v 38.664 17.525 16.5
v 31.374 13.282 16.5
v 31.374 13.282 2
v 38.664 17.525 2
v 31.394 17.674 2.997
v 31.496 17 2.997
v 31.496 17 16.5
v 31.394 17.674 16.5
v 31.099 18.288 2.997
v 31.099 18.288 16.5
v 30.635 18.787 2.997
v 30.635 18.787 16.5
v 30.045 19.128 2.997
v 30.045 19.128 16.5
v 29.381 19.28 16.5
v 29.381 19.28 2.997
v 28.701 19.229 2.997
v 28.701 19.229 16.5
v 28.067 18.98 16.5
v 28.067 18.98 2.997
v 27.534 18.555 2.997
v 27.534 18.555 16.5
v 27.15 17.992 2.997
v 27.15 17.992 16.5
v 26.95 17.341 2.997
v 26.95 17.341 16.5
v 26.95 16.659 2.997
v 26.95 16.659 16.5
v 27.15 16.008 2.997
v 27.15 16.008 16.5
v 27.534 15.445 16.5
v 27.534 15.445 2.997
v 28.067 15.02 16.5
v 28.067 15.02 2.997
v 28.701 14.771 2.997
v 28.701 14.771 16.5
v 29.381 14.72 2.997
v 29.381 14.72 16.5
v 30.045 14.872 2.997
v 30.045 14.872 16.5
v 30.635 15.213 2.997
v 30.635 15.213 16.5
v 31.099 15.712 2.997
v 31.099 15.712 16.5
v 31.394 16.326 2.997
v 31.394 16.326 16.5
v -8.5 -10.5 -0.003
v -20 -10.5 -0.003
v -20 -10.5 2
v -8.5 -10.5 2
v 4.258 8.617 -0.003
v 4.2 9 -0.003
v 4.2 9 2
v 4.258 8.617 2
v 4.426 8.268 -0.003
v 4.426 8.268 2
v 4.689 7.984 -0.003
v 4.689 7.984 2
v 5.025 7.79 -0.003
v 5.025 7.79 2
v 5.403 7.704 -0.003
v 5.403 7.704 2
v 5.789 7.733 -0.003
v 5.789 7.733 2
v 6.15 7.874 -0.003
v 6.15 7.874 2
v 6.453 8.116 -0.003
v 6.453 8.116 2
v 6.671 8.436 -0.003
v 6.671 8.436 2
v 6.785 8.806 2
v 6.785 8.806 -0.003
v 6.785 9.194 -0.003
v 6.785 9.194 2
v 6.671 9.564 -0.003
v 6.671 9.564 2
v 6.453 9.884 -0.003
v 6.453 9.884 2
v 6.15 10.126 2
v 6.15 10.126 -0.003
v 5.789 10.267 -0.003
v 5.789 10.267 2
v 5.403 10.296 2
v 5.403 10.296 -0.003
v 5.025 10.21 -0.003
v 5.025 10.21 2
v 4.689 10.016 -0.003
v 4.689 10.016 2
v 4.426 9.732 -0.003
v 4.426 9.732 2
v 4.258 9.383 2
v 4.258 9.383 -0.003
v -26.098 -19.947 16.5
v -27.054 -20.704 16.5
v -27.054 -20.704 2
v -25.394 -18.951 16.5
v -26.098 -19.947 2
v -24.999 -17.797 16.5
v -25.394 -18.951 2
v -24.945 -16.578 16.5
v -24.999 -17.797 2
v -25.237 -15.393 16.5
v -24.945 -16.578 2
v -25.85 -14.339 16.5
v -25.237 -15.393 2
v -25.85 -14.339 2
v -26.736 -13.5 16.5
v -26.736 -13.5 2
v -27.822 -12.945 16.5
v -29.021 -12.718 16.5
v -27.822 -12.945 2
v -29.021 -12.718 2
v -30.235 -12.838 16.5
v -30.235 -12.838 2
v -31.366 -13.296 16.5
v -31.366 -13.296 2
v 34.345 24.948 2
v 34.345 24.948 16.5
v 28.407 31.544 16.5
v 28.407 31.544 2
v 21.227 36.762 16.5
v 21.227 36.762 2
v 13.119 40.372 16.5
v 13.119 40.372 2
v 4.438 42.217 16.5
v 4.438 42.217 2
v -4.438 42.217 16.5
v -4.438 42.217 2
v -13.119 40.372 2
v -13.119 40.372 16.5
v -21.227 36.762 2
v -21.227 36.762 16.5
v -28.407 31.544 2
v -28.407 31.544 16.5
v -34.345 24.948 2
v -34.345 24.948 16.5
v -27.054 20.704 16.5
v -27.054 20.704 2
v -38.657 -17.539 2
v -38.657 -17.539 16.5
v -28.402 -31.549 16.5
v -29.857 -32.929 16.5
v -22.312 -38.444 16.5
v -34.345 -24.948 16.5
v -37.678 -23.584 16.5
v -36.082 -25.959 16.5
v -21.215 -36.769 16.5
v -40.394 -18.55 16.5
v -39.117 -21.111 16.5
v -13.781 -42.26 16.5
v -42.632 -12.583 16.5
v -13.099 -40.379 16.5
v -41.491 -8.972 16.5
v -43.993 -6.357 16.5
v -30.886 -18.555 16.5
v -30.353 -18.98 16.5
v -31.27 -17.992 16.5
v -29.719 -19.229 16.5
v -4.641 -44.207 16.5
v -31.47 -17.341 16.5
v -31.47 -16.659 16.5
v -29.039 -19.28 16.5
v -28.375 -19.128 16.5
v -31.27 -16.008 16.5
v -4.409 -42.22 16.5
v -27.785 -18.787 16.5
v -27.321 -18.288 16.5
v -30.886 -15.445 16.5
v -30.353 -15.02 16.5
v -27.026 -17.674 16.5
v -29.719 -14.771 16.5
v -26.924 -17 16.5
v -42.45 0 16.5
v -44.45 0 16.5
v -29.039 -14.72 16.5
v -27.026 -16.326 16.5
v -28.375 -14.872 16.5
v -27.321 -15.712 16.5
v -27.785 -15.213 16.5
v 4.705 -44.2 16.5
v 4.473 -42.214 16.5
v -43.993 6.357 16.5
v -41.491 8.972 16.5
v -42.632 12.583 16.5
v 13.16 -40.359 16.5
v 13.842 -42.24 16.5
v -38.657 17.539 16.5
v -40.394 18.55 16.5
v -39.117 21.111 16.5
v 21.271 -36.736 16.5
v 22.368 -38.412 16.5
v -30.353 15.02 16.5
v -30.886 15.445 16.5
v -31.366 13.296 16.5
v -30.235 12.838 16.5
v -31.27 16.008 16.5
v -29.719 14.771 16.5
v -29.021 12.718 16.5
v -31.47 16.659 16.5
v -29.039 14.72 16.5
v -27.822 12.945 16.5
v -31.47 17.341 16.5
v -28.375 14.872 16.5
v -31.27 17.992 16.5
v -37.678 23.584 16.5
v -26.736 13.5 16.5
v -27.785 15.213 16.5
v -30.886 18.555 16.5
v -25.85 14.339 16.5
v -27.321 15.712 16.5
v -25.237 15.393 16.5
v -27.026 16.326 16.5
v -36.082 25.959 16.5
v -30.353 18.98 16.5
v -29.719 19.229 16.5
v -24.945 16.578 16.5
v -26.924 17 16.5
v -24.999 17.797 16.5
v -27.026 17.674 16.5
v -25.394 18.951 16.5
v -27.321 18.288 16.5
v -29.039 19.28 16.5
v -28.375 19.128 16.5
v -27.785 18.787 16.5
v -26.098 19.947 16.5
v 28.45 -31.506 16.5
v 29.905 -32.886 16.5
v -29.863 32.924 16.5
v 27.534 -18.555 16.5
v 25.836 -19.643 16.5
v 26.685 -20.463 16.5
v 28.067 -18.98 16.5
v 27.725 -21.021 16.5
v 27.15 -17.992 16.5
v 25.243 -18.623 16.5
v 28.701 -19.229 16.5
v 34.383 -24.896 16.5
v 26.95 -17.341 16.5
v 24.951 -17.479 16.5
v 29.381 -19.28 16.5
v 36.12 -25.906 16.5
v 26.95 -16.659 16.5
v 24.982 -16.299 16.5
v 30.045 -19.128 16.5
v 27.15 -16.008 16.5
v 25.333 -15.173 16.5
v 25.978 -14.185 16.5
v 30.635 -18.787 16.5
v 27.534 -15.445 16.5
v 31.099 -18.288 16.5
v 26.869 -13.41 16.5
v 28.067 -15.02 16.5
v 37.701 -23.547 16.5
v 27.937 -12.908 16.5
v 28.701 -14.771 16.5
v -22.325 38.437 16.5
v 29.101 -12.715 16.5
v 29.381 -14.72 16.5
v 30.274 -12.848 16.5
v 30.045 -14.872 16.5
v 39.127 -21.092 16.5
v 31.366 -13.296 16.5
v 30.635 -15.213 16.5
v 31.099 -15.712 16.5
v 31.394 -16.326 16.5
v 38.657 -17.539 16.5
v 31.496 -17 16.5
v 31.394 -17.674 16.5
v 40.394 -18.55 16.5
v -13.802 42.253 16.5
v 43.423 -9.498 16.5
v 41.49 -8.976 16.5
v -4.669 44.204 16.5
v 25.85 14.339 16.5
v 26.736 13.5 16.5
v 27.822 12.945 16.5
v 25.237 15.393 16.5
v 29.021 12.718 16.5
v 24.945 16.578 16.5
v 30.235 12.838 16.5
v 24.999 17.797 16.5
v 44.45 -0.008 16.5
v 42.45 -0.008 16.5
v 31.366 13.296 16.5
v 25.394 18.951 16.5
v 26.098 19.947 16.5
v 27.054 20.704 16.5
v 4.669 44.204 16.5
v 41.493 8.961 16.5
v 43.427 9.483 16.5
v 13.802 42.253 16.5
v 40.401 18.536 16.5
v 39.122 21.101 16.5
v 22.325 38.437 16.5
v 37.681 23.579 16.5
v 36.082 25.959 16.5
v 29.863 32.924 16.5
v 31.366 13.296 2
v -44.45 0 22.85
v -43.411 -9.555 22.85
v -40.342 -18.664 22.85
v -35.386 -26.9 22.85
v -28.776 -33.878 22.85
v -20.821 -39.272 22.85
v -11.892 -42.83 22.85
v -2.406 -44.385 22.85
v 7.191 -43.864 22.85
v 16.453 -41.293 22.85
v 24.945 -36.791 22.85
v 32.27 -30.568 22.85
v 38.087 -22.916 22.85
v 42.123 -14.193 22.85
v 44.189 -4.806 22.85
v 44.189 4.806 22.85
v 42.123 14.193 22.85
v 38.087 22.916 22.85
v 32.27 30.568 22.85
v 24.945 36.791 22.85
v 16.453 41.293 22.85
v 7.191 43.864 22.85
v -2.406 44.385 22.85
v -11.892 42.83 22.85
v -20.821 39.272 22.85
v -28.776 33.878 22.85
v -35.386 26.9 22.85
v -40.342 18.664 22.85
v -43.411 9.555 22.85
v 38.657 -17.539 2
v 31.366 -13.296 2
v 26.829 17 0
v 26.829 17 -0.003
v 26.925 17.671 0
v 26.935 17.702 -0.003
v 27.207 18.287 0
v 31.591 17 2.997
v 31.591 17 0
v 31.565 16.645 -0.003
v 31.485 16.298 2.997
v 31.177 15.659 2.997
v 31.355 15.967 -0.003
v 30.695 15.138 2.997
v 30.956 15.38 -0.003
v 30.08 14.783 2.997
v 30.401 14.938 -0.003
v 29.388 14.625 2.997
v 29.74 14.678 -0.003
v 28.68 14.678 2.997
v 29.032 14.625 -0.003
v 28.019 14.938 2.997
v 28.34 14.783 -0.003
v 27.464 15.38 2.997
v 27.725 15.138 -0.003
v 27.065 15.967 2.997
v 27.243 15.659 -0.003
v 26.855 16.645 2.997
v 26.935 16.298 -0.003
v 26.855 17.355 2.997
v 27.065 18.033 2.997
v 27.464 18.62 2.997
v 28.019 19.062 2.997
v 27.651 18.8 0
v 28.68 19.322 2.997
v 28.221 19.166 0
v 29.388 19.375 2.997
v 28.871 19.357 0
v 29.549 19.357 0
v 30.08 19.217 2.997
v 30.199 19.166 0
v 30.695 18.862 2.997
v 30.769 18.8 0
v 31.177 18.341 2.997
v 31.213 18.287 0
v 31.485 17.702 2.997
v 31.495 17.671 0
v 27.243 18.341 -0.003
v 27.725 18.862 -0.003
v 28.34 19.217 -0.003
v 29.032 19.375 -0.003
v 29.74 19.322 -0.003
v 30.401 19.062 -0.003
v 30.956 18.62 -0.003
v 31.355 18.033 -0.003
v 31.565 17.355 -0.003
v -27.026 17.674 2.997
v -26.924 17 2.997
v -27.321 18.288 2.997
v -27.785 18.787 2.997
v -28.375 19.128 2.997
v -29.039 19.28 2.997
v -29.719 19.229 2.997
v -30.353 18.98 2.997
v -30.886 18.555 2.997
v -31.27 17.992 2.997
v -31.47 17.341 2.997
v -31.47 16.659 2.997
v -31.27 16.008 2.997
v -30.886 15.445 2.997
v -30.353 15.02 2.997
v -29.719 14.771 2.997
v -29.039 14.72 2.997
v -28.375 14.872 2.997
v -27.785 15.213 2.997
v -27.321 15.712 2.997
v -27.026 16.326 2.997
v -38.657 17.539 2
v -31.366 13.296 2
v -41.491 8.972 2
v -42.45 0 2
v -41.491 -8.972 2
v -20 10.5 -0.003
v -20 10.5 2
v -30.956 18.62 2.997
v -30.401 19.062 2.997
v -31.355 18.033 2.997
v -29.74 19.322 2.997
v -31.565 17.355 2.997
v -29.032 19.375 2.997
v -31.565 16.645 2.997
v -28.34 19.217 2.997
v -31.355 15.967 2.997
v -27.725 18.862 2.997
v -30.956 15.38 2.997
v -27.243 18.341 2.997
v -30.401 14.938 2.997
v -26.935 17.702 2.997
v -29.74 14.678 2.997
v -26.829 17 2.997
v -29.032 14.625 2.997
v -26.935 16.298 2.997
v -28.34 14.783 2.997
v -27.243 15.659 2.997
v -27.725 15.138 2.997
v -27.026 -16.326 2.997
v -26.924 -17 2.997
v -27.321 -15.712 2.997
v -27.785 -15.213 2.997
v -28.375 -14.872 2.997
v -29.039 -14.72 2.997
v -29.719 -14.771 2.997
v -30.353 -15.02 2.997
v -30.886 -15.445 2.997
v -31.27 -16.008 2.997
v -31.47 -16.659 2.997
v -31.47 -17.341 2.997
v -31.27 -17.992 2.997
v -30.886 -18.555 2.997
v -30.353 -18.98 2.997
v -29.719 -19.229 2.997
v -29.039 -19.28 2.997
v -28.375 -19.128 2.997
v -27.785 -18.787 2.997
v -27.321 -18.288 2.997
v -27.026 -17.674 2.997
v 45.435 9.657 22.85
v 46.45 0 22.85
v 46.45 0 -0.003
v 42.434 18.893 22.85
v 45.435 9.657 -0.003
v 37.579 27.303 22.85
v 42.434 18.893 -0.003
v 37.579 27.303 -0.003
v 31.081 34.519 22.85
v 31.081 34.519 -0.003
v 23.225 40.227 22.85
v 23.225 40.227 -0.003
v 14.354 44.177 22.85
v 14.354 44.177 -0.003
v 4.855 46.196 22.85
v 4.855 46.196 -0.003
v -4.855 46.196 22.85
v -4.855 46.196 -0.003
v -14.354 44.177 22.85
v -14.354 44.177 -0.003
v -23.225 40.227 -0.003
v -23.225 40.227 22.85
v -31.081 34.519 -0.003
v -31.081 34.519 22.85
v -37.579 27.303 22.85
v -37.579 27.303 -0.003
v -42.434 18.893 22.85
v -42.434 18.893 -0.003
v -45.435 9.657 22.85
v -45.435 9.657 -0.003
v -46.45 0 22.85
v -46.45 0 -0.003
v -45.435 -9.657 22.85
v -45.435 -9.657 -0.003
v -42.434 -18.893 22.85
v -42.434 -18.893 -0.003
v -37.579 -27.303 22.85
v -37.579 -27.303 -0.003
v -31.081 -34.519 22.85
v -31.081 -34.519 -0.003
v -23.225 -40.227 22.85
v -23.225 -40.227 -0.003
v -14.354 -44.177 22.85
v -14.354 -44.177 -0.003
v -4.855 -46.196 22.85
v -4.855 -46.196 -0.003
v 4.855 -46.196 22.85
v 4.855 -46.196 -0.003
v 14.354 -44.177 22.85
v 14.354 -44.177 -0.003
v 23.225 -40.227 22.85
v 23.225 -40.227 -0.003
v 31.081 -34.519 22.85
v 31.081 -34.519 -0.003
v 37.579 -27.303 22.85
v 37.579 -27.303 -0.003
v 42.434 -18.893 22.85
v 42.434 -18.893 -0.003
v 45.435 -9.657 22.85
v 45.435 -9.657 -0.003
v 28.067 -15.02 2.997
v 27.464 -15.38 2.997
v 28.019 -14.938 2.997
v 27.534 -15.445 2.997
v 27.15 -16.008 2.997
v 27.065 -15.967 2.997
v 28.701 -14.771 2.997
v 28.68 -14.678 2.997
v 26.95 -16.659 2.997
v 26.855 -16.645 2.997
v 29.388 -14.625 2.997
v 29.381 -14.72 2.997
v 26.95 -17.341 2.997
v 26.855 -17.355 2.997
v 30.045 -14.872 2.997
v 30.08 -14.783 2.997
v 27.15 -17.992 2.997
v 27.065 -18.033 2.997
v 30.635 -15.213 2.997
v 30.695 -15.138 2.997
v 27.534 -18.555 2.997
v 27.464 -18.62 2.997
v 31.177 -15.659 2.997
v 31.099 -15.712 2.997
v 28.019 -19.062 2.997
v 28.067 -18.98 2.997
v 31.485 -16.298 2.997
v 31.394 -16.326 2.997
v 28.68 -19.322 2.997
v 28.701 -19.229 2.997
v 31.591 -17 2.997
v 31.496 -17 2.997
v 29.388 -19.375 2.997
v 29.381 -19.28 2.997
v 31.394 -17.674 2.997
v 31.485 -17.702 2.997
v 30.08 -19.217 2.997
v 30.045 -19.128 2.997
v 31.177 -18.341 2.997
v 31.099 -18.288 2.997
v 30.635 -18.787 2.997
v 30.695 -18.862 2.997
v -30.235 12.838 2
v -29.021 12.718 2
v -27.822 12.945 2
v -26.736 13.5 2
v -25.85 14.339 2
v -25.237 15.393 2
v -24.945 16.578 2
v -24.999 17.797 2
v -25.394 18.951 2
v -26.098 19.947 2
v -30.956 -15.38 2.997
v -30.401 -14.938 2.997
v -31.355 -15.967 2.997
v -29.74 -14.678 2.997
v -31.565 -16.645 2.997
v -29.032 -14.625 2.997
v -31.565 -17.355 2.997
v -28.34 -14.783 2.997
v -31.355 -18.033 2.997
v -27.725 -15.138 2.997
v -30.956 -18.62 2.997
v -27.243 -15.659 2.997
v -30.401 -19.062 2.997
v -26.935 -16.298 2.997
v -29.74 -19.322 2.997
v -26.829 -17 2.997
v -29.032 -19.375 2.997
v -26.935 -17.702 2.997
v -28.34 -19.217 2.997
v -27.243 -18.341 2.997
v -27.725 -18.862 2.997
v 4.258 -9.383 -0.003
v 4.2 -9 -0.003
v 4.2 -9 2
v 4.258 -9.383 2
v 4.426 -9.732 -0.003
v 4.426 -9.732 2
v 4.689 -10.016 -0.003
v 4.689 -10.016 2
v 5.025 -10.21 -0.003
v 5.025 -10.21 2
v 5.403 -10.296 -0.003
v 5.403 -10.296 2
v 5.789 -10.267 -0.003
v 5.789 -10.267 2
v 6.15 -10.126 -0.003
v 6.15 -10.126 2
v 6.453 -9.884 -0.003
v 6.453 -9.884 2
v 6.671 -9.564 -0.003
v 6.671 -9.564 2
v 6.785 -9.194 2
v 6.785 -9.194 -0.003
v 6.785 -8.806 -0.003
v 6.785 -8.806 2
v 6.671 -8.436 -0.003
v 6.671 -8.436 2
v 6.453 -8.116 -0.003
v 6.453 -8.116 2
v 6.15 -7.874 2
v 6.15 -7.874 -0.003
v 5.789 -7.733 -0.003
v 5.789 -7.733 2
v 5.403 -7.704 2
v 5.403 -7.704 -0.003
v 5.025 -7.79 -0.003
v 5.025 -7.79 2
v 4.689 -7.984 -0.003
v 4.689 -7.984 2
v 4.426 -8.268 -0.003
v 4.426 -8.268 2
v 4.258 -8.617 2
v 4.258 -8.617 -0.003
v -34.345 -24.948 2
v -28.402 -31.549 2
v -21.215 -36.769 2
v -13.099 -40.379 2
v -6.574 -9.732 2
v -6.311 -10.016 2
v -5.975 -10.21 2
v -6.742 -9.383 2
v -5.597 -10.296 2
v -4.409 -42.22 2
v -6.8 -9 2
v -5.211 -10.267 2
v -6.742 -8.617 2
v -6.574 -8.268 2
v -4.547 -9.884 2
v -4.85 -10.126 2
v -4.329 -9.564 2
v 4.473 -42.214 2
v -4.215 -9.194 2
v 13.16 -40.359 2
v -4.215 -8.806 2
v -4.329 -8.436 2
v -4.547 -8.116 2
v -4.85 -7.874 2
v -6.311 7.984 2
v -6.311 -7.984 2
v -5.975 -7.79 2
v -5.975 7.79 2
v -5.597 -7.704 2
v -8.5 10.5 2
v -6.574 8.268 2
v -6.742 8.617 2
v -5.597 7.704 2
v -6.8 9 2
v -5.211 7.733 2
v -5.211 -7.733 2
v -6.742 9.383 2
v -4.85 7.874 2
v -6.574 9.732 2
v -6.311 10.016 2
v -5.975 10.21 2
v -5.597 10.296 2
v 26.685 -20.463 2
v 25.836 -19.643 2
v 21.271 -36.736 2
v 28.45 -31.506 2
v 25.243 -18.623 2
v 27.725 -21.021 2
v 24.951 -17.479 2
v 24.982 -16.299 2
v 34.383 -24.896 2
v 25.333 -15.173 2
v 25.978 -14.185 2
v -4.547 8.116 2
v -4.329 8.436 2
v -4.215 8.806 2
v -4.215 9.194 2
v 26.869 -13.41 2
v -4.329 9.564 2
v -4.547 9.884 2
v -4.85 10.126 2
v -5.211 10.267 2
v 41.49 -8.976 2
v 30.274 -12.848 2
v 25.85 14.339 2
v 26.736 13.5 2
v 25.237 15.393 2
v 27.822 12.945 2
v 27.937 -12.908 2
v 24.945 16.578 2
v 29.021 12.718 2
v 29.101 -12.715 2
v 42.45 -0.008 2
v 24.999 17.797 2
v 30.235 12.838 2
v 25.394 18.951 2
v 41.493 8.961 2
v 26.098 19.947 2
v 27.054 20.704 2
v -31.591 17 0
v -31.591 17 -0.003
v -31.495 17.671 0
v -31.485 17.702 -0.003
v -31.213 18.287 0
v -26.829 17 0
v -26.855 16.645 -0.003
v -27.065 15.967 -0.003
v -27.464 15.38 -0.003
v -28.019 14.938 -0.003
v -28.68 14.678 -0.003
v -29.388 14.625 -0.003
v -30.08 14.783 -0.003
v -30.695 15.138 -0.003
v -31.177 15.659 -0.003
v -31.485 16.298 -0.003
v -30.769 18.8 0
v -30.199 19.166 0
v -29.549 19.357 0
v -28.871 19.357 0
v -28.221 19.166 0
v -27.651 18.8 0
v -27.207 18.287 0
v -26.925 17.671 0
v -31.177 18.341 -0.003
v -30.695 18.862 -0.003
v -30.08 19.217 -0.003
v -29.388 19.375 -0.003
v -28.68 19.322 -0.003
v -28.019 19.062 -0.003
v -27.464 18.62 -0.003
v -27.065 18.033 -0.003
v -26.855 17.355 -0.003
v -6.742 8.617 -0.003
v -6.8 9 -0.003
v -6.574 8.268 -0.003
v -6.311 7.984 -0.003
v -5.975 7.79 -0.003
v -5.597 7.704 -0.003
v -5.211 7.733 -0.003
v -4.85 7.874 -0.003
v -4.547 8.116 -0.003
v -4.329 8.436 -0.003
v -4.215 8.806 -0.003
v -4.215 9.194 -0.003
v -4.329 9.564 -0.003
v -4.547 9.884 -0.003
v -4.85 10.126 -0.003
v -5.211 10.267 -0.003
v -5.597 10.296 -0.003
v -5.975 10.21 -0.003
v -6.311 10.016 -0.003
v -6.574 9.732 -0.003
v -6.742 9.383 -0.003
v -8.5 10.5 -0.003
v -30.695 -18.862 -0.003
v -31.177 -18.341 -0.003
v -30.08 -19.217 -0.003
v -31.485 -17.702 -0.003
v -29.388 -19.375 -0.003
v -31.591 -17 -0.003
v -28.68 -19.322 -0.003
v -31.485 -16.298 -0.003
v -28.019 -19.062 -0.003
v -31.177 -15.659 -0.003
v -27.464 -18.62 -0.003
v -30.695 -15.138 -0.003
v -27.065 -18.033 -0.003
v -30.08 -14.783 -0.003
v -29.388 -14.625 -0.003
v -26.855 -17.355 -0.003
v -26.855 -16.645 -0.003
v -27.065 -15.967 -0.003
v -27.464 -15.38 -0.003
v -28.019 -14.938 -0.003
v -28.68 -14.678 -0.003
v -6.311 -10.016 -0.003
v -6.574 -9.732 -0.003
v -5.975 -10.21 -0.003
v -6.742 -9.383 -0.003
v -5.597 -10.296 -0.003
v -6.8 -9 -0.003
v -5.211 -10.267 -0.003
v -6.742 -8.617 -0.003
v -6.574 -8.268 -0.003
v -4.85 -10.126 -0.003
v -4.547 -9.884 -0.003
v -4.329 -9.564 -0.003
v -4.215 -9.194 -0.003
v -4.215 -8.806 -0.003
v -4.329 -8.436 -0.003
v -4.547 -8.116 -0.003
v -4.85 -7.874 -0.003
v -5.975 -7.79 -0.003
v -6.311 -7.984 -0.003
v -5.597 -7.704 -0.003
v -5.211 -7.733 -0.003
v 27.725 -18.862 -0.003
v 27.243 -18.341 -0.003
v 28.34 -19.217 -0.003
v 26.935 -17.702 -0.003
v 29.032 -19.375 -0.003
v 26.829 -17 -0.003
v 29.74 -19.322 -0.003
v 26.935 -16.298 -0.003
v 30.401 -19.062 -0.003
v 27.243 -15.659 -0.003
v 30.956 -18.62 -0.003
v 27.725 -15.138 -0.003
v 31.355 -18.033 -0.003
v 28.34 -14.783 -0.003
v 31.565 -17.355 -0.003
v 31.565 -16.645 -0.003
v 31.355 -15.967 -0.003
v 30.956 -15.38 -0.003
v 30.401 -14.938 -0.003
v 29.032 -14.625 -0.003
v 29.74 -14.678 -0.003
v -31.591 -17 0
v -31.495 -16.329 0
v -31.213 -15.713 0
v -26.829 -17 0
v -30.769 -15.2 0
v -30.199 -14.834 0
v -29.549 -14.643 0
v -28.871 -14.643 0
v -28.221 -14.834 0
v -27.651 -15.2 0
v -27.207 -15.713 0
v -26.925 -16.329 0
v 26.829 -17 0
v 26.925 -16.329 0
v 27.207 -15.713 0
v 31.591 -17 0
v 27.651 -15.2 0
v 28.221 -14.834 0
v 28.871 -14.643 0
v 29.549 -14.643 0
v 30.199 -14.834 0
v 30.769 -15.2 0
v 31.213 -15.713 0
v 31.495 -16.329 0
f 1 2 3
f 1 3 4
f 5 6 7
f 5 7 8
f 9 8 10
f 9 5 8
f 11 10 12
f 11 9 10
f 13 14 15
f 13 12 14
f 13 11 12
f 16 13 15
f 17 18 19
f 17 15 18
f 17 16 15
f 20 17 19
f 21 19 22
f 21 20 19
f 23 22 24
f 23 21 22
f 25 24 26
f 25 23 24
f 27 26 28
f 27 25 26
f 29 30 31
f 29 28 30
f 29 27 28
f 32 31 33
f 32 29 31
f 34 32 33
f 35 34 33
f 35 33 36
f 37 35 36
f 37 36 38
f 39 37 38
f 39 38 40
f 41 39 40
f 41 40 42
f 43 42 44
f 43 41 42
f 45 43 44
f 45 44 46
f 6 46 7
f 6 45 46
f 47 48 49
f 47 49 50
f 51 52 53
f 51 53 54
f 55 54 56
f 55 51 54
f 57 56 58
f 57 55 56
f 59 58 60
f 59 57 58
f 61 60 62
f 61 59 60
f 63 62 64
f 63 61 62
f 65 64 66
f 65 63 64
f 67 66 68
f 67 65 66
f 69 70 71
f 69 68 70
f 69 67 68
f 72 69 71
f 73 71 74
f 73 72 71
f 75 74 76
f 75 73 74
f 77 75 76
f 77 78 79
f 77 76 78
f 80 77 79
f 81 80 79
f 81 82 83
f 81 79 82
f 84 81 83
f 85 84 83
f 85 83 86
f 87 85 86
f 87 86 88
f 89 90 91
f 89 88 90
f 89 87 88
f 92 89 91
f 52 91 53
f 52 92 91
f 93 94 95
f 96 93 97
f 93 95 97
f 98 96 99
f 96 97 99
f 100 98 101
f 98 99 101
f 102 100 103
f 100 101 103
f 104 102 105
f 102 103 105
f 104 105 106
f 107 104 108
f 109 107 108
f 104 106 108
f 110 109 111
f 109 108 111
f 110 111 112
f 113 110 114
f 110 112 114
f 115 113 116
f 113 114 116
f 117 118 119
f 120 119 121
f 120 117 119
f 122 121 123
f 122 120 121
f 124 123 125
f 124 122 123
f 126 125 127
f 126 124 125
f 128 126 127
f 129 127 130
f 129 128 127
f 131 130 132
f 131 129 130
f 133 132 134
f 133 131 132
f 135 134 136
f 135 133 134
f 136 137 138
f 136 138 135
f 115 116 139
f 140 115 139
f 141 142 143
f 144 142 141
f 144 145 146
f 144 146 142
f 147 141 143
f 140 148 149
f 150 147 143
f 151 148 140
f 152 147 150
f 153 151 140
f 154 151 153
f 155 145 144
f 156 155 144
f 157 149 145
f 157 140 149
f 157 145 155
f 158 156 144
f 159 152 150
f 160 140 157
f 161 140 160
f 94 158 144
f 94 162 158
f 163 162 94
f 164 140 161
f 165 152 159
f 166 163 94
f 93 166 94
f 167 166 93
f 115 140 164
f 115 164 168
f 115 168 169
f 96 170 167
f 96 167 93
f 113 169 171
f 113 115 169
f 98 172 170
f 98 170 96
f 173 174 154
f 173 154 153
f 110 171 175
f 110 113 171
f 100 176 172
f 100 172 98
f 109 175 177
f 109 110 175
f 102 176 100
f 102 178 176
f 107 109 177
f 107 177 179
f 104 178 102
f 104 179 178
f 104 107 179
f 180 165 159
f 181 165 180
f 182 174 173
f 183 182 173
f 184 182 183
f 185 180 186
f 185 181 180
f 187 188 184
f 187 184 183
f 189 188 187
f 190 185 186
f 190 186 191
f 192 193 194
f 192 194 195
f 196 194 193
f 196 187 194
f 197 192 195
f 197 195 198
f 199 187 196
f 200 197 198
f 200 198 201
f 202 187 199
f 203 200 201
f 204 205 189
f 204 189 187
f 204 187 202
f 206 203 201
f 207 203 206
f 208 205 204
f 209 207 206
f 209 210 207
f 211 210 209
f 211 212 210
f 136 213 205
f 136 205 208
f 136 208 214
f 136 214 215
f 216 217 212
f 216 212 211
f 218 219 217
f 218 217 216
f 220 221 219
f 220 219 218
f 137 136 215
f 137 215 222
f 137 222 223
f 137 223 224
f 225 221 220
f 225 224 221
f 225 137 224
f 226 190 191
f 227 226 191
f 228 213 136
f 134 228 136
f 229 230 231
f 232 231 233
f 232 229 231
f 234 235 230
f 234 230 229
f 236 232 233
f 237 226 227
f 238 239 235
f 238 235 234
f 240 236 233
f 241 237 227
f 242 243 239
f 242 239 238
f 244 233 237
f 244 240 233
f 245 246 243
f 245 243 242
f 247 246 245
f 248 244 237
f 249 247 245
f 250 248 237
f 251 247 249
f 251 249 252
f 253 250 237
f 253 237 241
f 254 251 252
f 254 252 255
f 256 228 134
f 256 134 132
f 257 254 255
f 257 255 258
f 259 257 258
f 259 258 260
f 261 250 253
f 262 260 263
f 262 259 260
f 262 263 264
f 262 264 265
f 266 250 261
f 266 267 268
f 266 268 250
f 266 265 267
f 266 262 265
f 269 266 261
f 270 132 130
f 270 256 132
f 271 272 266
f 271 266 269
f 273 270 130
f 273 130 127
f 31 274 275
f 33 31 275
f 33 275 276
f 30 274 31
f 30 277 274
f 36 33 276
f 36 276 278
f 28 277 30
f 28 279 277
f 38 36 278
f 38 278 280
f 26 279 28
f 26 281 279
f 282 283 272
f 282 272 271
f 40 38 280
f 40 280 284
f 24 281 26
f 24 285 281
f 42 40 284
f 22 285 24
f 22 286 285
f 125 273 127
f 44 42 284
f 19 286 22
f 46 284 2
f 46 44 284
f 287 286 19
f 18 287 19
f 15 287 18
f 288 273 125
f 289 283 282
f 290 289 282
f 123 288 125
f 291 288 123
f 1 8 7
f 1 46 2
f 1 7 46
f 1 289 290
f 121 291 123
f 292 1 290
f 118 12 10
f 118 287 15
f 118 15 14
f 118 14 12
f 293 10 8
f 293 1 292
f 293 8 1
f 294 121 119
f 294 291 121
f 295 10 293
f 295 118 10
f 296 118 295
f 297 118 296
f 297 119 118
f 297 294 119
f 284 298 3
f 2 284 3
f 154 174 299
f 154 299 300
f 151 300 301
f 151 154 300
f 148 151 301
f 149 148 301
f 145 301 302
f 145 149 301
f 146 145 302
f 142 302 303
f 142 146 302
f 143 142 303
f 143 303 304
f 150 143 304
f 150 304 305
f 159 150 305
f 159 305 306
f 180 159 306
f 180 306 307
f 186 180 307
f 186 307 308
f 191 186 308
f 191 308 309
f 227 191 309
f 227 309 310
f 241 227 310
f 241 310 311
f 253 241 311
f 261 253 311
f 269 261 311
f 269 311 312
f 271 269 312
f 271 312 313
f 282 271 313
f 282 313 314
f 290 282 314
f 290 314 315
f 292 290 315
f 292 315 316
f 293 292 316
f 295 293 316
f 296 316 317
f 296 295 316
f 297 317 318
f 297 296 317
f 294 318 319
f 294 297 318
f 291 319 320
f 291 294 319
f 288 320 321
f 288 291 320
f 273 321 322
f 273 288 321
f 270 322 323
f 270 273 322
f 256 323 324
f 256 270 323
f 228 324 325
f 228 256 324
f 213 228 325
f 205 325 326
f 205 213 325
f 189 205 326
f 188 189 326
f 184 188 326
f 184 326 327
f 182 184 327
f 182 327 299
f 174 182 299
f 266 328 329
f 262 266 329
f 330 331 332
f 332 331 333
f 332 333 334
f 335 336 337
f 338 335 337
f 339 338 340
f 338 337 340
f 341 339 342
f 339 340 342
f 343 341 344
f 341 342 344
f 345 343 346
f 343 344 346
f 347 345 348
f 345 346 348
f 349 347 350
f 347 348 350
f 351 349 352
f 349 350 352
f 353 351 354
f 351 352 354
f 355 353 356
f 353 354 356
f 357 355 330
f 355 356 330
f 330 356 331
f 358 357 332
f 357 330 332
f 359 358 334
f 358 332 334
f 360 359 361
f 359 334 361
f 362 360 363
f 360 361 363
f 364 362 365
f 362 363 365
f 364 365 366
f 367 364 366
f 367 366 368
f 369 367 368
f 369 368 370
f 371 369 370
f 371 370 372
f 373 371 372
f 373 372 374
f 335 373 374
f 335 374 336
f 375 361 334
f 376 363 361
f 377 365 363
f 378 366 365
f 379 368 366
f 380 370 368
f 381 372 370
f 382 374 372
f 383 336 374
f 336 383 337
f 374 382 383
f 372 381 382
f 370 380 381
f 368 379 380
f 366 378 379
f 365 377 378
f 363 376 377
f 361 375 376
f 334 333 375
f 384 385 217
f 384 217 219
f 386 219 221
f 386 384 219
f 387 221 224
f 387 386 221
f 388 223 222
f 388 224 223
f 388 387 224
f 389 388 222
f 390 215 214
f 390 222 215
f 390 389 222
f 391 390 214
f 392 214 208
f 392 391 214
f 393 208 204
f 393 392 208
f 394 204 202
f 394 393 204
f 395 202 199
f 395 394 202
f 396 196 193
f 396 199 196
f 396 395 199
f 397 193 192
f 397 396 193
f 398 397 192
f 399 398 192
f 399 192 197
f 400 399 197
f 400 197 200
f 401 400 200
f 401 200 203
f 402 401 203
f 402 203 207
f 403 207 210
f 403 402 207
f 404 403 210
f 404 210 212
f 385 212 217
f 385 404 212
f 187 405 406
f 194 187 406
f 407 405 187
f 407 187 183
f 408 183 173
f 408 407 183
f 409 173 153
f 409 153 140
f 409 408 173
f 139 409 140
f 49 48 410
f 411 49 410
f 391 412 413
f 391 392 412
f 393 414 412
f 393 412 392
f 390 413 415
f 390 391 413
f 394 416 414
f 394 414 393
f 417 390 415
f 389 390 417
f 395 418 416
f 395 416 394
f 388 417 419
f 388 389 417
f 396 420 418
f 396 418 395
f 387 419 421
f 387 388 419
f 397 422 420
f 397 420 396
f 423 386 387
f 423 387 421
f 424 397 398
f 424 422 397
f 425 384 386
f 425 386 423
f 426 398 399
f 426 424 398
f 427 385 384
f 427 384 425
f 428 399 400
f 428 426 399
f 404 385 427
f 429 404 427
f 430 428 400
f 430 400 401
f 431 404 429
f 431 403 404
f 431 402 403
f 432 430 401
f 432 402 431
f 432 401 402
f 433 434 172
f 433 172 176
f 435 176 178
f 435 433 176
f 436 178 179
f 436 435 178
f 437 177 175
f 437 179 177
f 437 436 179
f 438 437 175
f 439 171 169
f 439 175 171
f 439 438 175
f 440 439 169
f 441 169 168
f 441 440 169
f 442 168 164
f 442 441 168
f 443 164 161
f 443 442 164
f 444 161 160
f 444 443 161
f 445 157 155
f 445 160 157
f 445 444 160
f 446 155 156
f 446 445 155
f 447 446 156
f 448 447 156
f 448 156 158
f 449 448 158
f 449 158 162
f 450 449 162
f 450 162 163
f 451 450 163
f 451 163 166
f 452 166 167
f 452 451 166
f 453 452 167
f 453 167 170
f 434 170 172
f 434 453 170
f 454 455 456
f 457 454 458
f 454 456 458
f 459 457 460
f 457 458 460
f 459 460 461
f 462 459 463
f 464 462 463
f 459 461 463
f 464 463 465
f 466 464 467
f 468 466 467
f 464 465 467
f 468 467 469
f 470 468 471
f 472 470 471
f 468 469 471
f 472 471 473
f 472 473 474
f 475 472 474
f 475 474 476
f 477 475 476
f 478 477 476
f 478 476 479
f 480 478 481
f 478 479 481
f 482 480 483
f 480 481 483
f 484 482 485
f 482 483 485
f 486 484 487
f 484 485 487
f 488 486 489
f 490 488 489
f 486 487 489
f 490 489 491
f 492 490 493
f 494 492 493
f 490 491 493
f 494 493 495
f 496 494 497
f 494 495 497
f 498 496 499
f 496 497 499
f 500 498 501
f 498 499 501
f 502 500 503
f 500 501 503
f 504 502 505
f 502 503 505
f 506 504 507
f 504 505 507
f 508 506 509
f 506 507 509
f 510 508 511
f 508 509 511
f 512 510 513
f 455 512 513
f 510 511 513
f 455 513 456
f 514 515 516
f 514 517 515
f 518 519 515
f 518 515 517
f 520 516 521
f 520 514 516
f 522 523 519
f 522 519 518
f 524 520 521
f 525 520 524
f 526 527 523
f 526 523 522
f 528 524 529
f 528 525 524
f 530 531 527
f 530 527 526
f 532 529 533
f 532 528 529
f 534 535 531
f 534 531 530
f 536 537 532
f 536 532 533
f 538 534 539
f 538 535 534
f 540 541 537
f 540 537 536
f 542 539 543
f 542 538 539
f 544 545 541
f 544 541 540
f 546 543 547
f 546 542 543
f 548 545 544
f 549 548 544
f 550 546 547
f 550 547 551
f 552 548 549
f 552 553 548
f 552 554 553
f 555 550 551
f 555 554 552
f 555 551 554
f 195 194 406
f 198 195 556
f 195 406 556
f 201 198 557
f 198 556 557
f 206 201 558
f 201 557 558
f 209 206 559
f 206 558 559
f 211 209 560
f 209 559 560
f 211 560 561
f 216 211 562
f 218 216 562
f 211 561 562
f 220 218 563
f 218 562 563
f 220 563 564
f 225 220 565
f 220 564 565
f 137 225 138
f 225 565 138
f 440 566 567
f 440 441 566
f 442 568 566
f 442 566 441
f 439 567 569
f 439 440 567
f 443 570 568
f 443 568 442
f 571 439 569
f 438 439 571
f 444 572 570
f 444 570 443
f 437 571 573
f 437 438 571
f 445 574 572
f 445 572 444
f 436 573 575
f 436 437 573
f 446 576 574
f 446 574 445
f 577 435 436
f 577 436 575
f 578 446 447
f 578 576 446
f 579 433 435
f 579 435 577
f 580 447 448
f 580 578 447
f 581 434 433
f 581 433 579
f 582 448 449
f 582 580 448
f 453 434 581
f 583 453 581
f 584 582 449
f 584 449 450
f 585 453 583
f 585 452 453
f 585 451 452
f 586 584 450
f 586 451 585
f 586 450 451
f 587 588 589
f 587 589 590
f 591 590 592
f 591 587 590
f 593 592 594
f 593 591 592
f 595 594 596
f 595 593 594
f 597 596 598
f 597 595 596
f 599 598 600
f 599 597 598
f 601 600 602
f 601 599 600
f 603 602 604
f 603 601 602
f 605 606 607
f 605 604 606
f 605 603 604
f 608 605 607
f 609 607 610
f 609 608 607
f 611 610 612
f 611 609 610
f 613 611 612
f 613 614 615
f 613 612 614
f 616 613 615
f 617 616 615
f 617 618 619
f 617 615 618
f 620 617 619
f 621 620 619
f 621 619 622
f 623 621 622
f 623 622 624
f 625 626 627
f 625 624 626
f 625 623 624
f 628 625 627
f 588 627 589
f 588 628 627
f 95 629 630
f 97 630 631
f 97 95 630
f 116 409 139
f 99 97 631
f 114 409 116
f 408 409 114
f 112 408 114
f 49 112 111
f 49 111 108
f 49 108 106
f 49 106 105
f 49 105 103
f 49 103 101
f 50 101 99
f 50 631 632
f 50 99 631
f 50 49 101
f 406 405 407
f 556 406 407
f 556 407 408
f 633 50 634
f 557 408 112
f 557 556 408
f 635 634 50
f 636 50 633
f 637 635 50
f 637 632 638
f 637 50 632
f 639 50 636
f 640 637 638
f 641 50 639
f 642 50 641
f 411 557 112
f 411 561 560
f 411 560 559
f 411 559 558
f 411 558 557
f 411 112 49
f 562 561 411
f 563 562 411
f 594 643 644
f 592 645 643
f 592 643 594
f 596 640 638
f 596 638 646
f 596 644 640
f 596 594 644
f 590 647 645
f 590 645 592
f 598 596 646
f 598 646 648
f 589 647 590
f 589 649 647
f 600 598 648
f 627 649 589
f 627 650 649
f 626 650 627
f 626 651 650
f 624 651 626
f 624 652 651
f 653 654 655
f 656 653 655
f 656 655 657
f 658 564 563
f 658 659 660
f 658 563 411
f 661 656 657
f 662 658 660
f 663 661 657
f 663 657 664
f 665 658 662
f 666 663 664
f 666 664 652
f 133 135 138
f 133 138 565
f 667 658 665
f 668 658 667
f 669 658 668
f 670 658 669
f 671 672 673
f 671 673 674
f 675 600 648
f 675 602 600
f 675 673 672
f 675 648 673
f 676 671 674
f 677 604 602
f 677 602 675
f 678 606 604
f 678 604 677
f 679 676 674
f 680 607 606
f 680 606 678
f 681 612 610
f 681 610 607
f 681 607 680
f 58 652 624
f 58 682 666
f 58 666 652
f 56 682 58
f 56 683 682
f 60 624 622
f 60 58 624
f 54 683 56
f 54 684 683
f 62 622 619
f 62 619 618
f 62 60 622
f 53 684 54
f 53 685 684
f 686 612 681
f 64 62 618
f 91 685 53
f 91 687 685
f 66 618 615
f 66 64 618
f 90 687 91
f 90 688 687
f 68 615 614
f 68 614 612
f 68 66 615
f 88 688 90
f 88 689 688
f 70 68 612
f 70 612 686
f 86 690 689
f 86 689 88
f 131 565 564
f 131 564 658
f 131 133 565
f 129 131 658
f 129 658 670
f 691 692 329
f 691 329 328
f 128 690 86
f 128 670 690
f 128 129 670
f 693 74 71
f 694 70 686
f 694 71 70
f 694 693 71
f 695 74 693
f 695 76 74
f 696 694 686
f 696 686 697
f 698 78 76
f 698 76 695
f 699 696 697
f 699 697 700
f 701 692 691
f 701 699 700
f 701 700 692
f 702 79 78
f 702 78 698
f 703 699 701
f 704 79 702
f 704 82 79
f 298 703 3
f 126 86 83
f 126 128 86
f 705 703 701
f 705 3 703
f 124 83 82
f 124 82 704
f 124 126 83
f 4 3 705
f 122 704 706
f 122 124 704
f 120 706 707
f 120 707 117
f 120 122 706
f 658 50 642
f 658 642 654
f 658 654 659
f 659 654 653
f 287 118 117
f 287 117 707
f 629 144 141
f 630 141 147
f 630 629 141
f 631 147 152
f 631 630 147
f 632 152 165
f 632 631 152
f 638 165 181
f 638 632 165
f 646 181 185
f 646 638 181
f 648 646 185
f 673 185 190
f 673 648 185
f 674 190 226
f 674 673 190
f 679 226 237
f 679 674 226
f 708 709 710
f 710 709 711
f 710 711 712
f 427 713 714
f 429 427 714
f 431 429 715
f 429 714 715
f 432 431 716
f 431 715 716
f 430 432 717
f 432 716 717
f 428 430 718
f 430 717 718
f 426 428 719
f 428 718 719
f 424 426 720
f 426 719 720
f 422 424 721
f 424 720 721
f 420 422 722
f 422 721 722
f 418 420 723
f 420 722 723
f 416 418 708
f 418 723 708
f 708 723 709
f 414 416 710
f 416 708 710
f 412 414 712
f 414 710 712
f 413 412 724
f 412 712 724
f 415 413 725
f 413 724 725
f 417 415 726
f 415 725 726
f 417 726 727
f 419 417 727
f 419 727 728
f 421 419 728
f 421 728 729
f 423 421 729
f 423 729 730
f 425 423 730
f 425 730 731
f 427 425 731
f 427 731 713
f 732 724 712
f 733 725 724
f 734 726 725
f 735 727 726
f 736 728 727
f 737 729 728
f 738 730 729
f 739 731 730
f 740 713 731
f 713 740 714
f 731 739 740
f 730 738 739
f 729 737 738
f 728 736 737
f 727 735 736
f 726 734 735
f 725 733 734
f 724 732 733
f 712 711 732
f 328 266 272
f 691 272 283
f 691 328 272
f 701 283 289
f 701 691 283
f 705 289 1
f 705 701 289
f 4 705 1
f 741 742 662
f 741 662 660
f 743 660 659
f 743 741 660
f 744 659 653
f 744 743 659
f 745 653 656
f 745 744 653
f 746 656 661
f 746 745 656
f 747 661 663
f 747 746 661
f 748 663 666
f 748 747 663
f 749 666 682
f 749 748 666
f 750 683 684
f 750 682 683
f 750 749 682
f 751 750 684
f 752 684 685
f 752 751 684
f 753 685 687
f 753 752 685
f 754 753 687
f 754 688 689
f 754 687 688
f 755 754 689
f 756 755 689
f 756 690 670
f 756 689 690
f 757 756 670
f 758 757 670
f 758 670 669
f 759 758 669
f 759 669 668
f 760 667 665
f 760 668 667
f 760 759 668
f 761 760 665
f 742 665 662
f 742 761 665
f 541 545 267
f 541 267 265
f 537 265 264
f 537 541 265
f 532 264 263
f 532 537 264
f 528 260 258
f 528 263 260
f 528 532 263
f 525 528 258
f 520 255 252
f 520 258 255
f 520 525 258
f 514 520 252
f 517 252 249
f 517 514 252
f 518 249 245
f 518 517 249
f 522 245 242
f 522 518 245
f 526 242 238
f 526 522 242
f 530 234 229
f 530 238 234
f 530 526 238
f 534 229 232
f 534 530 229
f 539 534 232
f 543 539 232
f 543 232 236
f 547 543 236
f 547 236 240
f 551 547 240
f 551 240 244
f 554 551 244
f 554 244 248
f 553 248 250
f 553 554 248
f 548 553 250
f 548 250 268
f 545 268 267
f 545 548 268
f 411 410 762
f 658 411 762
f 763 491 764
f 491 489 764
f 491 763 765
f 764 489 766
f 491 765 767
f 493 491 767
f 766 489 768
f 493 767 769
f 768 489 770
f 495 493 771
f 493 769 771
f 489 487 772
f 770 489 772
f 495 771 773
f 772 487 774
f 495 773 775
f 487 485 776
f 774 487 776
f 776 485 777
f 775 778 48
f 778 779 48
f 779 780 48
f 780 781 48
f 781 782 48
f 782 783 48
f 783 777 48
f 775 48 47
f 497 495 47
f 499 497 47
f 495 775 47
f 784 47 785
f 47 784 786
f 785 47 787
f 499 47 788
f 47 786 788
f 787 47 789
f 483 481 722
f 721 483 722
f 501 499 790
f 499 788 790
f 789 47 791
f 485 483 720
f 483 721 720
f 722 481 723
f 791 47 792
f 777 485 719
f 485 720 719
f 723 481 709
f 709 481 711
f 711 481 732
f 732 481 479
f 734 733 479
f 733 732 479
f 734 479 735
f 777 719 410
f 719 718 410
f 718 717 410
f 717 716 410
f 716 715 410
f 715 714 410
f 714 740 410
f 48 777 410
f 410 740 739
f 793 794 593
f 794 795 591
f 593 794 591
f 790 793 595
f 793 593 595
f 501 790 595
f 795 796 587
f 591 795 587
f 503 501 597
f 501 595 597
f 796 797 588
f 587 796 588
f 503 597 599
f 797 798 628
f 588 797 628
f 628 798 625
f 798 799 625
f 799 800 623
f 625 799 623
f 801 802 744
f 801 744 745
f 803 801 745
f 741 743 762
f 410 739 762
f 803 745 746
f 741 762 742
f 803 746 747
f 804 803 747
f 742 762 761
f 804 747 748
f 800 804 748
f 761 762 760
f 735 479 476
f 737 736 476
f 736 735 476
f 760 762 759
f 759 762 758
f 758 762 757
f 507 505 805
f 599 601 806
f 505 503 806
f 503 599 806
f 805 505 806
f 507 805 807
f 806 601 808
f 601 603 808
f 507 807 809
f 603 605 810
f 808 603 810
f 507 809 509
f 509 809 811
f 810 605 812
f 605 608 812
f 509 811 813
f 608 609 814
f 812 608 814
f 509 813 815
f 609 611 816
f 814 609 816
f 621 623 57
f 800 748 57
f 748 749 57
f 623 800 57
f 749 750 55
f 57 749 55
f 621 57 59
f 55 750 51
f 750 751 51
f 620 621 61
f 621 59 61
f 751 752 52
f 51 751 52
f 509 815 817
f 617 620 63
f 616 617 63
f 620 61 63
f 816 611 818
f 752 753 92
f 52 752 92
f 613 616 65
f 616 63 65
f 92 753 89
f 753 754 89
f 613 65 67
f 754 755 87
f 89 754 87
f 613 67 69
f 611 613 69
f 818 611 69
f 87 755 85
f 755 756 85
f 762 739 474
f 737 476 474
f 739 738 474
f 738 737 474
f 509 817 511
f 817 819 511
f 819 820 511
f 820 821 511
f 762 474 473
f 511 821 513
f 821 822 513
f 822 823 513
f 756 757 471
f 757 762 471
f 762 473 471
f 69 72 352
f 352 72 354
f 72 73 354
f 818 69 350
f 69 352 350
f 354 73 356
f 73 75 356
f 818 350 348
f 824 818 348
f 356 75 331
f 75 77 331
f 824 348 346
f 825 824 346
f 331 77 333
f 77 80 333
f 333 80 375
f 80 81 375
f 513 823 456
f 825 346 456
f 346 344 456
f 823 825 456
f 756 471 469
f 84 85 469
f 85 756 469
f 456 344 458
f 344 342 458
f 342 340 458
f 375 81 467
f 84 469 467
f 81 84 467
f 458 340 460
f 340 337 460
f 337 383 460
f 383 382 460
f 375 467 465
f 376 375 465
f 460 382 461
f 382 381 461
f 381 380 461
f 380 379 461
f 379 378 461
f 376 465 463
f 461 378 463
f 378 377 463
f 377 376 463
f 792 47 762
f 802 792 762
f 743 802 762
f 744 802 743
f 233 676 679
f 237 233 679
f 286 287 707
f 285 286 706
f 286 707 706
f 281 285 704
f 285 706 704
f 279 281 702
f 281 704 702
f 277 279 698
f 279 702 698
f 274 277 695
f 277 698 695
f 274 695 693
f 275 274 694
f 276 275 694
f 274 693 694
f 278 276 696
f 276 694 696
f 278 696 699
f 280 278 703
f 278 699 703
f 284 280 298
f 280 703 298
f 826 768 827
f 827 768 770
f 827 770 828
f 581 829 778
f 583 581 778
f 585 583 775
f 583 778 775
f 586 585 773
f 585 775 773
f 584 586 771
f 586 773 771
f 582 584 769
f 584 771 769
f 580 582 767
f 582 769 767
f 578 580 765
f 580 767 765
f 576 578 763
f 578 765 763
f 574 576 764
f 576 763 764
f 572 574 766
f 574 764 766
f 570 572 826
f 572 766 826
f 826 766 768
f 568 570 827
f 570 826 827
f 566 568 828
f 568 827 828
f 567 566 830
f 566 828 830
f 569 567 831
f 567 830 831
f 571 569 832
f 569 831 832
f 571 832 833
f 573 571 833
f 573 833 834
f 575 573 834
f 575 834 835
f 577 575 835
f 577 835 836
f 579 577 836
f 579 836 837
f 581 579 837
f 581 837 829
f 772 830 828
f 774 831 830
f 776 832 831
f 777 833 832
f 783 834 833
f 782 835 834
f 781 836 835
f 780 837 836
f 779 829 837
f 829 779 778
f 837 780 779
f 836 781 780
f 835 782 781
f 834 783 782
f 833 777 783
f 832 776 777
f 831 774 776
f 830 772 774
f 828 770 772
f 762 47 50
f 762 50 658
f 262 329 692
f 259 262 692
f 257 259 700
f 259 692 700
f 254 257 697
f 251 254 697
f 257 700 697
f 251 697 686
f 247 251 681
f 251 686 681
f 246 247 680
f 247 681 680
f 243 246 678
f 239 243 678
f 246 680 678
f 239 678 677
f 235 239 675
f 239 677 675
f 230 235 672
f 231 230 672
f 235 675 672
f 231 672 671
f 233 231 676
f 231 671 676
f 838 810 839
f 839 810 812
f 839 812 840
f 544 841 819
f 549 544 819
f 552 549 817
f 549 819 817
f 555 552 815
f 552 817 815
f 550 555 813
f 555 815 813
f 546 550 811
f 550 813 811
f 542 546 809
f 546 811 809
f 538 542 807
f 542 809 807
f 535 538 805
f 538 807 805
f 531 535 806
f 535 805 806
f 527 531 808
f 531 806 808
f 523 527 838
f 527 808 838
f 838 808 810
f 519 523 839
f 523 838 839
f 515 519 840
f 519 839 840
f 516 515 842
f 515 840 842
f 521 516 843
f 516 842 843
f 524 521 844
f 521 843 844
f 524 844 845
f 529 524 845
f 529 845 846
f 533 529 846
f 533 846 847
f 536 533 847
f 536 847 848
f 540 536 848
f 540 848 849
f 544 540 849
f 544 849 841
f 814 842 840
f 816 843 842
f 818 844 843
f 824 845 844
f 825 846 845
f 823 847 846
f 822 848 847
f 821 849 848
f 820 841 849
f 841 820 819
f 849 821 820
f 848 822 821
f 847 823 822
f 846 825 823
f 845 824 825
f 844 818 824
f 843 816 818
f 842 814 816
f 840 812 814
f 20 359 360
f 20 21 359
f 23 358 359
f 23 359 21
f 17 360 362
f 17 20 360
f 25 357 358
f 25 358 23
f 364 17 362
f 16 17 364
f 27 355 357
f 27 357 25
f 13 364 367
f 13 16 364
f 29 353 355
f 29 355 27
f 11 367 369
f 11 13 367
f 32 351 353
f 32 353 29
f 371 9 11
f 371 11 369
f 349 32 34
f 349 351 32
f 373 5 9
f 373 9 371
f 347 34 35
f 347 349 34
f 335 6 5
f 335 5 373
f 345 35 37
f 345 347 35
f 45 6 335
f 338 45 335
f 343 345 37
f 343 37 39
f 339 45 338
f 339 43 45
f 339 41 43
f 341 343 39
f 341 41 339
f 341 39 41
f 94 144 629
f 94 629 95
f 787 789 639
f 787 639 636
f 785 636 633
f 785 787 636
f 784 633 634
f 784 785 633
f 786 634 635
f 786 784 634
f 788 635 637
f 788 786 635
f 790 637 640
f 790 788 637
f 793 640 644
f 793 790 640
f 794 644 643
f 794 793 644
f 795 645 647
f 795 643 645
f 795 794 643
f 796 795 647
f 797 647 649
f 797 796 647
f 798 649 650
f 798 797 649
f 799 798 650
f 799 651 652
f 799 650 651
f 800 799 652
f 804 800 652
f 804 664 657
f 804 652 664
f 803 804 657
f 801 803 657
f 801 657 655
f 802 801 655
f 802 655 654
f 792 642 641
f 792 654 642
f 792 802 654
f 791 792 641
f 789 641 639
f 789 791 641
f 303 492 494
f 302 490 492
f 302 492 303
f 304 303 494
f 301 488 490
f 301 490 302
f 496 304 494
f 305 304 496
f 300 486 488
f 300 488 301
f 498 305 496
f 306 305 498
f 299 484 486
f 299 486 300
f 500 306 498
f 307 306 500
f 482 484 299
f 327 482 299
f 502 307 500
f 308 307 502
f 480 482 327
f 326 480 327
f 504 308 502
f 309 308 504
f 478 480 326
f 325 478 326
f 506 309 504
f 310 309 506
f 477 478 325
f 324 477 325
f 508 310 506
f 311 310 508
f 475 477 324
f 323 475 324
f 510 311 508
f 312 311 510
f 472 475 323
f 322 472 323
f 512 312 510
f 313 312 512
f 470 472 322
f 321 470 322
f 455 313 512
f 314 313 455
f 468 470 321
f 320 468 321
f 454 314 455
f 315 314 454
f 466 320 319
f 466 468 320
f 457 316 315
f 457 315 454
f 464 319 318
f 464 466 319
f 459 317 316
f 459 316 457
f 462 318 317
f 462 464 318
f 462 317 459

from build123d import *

# Parameters (mm, degrees)
BOSS_EXTRUDE5_DEPTH         = 22.85
BOSS_EXTRUDE5_DEPTH_BACK    = 0.00254
SKETCH1_R                   = 46.45
SKETCH1_12_R                = 44.45
CUT_EXTRUDE13_DEPTH         = 70.550898628
F_3_16_0_1875_DOWEL_HOLE1_D = 4.7625
F_3_16_0_1875_DOWEL_HOLE3_D = 4.7625
F_3_16_0_1875_DOWEL_HOLE4_D = 4.7625
F_3_16_0_1875_DOWEL_HOLE5_D = 4.7625
SKETCH1_21_R                = 44.45
SKETCH1_21_R_2              = 42.45
BOSS_EXTRUDE16_DEPTH        = 16.5
BOSS_EXTRUDE15_DEPTH        = 16.5
CUT_EXTRUDE21_DEPTH         = 70.550898628
CUT_EXTRUDE21_DEPTH_BACK    = 4
SKETCH24_4_R                = 2.286
SKETCH25_R                  = 42.45
BOSS_EXTRUDE17_DEPTH        = 2
CUT_EXTRUDE22_DEPTH         = 70.550898628
CUT_EXTRUDE22_DEPTH_BACK    = 70.550898628
SKETCH21_W                  = 11.5
SKETCH21_H                  = 21
SKETCH21_R                  = 1.3
SKETCH21_R_2                = 1.3000014
SKETCH26_R                  = 2.38125
CUT_EXTRUDE23_DEPTH         = 3


with BuildPart() as part:
    # Sketch1 → Boss-Extrude5 (new, two sides: drawn at the far end of the back side and taken through both)
    with BuildSketch(Plane.XY.offset(-BOSS_EXTRUDE5_DEPTH_BACK)):
        Circle(SKETCH1_R)
    extrude(amount=BOSS_EXTRUDE5_DEPTH + BOSS_EXTRUDE5_DEPTH_BACK)

    # Sketch1<12> → Cut-Extrude13 (cut, through all)
    with BuildSketch(Plane.XY):
        Circle(SKETCH1_12_R)
    extrude(amount=CUT_EXTRUDE13_DEPTH, mode=Mode.SUBTRACT)

    # 3/16 (0.1875) Dowel Hole1 (through all)
    with Locations(Plane.XY):
        with Locations((-29.21, 17.000000036)):
            Hole(F_3_16_0_1875_DOWEL_HOLE1_D / 2)

    # 3/16 (0.1875) Dowel Hole3 (through all)
    with Locations(Plane.XY):
        with Locations((-29.21, -16.999999964)):
            Hole(F_3_16_0_1875_DOWEL_HOLE3_D / 2)

    # 3/16 (0.1875) Dowel Hole4 (through all)
    with Locations(Plane.XY):
        with Locations((29.21, -16.999999964)):
            Hole(F_3_16_0_1875_DOWEL_HOLE4_D / 2)

    # 3/16 (0.1875) Dowel Hole5 (through all)
    with Locations(Plane.XY):
        with Locations((29.21, 17.000000036)):
            Hole(F_3_16_0_1875_DOWEL_HOLE5_D / 2)

    # Sketch1<21> → Boss-Extrude16 (add)
    with BuildSketch(Plane.XY):
        Circle(SKETCH1_21_R)
        Circle(SKETCH1_21_R_2, mode=Mode.SUBTRACT)
    extrude(amount=BOSS_EXTRUDE16_DEPTH)

    # Sketch24 → Boss-Extrude15 (add)
    with BuildSketch(Plane.XY):
        with BuildLine():
            Line((40.581072285, 18.64087695), (36.261488643, 26.062938004))
            Line((36.261488643, 26.062938004), (27.054115803, 20.704316346))
            ThreePointArc((27.054115803, 20.704316346), (25.50568369, 14.844115839), (31.365884197, 13.295683726))
            Line((31.365884197, 13.295683726), (31.373699445, 13.282255292))
            Line((31.373699445, 13.282255292), (40.581072285, 18.64087695))
        make_face()
        with BuildLine():
            Line((27.725141272, -21.020570888), (36.293779908, -26.007454028))
            Line((36.293779908, -26.007454028), (40.573257072, -18.654305309))
            Line((40.573257072, -18.654305309), (31.365884191, -13.29568365))
            ThreePointArc((31.365884191, -13.29568365), (25.333011542, -15.172773516), (27.725141272, -21.020570888))
        make_face()
        with BuildLine():
            Line((-36.261488643, 26.062938004), (-40.573257038, 18.654305383))
            Line((-40.573257038, 18.654305383), (-31.365884197, 13.295683726))
            ThreePointArc((-31.365884197, 13.295683726), (-25.50568369, 14.844115839), (-27.054115803, 20.704316346))
            Line((-27.054115803, 20.704316346), (-36.261488643, 26.062938004))
        make_face()
        with BuildLine():
            Line((-31.365884191, -13.29568365), (-40.573257072, -18.654305309))
            Line((-40.573257072, -18.654305309), (-36.261488691, -26.062937937))
            Line((-36.261488691, -26.062937937), (-27.054115809, -20.704316278))
            ThreePointArc((-27.054115809, -20.704316278), (-25.505683686, -14.844115773), (-31.365884191, -13.29568365))
        make_face()
    extrude(amount=BOSS_EXTRUDE15_DEPTH)

    # Sketch24<4> → Cut-Extrude21 (cut, two sides: drawn at the far end of the back side and taken through both)
    with BuildSketch(Plane.XY.offset(-CUT_EXTRUDE21_DEPTH_BACK)):
        with Locations((29.21, 17.000000036)):
            Circle(SKETCH24_4_R)
        with Locations((29.21, -16.999999964)):
            Circle(SKETCH24_4_R)
        with Locations((-29.21, 17.000000036)):
            Circle(SKETCH24_4_R)
        with Locations((-29.21, -16.999999964)):
            Circle(SKETCH24_4_R)
    extrude(amount=CUT_EXTRUDE21_DEPTH + CUT_EXTRUDE21_DEPTH_BACK, mode=Mode.SUBTRACT)

    # Sketch25 → Boss-Extrude17 (add)
    with BuildSketch(Plane.XY):
        Circle(SKETCH25_R)
    extrude(amount=BOSS_EXTRUDE17_DEPTH)

    # Sketch21 → Cut-Extrude22 (cut, two sides: drawn at the far end of the back side and taken through both)
    with BuildSketch(Plane.XY.offset(-CUT_EXTRUDE22_DEPTH_BACK)):
        with Locations((-14.25, 0)):
            Rectangle(SKETCH21_W, SKETCH21_H)
        with Locations((-5.5, 9)):
            Circle(SKETCH21_R)
        with Locations((5.5, 9)):
            Circle(SKETCH21_R)
        with Locations((5.5, -9)):
            Circle(SKETCH21_R)
        with Locations((-5.5, -9)):
            Circle(SKETCH21_R_2)
    extrude(amount=CUT_EXTRUDE22_DEPTH + CUT_EXTRUDE22_DEPTH_BACK, mode=Mode.SUBTRACT)

    # Sketch26 → Cut-Extrude23 (cut)
    with BuildSketch(Plane(origin=(0, 0, -0.00254), x_dir=(-1, 0, 0), z_dir=(0, 0, -1))):
        with Locations((29.21, -16.999999964)):
            Circle(SKETCH26_R)
        with Locations((29.21, 17.000000036)):
            Circle(SKETCH26_R)
        with Locations((-29.21, 17.000000036)):
            Circle(SKETCH26_R)
        with Locations((-29.21, -16.999999964)):
            Circle(SKETCH26_R)
    extrude(amount=-CUT_EXTRUDE23_DEPTH, mode=Mode.SUBTRACT)


solid = part.part
